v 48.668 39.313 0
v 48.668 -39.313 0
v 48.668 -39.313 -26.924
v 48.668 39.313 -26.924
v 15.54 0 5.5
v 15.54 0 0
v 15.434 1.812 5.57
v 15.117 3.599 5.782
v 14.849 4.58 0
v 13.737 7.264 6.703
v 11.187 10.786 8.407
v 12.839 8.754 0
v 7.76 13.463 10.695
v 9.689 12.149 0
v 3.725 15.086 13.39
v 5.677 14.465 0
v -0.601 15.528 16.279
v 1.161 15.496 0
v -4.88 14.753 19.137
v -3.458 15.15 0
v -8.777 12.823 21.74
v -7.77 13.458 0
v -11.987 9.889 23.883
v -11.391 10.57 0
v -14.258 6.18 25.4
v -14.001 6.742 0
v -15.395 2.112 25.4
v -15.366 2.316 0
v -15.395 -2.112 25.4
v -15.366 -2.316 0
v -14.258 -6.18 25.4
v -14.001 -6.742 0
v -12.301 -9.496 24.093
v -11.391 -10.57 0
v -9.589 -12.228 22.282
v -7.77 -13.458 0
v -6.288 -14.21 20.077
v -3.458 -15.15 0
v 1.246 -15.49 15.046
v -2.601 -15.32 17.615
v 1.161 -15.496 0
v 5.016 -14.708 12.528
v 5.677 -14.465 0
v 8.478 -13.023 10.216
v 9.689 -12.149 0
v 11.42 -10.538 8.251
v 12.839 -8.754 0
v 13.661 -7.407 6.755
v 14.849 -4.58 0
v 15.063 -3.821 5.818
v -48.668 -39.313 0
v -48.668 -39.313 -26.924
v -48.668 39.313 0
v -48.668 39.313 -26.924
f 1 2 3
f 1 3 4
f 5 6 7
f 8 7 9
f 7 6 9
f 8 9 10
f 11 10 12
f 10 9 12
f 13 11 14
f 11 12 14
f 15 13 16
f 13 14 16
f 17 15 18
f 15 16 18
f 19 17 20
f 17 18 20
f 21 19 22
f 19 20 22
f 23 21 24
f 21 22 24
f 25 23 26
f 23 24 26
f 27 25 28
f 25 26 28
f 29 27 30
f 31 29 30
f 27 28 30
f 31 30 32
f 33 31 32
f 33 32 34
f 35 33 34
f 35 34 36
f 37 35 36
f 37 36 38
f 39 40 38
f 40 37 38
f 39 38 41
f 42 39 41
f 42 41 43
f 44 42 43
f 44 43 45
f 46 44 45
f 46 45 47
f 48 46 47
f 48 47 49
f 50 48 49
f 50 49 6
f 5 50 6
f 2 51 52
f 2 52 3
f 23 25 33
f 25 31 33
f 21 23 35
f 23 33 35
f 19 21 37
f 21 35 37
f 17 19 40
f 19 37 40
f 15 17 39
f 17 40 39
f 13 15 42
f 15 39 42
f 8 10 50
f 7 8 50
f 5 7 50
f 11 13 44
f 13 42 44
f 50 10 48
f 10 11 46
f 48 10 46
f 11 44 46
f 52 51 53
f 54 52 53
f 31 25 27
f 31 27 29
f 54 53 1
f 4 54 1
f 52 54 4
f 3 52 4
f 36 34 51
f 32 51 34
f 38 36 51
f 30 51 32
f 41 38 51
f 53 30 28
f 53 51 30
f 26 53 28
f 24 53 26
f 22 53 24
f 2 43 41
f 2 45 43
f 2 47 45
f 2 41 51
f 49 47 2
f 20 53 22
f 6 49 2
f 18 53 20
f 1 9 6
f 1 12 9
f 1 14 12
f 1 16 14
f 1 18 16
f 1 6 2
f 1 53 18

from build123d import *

# Parameters (mm, degrees)
F0_W     = 97.335488
F0_H     = 78.626908
F1_DEPTH = 26.924
F2_R     = 15.53957
F3_DEPTH = 25.4
F5_DEPTH = 63.5


with BuildPart() as f1:
    # F0 (on Top) → F1 (new body)
    with BuildSketch(Plane.XY):
        Rectangle(F0_W, F0_H)
    extrude(amount=-F1_DEPTH)

    # F2 (on Top) → F3 (join)
    with BuildSketch(Plane.XY):
        Circle(F2_R)
    extrude(amount=F3_DEPTH)

    # F4 (on Front) → F5 (cut, symmetric)
    with BuildSketch(Plane.XZ):
        Polygon((23.7744, 28.803602), (-18.8976, 28.4988), (23.7744, 0), align=None)
    extrude(amount=F5_DEPTH, both=True, mode=Mode.SUBTRACT)


solid = f1.part
